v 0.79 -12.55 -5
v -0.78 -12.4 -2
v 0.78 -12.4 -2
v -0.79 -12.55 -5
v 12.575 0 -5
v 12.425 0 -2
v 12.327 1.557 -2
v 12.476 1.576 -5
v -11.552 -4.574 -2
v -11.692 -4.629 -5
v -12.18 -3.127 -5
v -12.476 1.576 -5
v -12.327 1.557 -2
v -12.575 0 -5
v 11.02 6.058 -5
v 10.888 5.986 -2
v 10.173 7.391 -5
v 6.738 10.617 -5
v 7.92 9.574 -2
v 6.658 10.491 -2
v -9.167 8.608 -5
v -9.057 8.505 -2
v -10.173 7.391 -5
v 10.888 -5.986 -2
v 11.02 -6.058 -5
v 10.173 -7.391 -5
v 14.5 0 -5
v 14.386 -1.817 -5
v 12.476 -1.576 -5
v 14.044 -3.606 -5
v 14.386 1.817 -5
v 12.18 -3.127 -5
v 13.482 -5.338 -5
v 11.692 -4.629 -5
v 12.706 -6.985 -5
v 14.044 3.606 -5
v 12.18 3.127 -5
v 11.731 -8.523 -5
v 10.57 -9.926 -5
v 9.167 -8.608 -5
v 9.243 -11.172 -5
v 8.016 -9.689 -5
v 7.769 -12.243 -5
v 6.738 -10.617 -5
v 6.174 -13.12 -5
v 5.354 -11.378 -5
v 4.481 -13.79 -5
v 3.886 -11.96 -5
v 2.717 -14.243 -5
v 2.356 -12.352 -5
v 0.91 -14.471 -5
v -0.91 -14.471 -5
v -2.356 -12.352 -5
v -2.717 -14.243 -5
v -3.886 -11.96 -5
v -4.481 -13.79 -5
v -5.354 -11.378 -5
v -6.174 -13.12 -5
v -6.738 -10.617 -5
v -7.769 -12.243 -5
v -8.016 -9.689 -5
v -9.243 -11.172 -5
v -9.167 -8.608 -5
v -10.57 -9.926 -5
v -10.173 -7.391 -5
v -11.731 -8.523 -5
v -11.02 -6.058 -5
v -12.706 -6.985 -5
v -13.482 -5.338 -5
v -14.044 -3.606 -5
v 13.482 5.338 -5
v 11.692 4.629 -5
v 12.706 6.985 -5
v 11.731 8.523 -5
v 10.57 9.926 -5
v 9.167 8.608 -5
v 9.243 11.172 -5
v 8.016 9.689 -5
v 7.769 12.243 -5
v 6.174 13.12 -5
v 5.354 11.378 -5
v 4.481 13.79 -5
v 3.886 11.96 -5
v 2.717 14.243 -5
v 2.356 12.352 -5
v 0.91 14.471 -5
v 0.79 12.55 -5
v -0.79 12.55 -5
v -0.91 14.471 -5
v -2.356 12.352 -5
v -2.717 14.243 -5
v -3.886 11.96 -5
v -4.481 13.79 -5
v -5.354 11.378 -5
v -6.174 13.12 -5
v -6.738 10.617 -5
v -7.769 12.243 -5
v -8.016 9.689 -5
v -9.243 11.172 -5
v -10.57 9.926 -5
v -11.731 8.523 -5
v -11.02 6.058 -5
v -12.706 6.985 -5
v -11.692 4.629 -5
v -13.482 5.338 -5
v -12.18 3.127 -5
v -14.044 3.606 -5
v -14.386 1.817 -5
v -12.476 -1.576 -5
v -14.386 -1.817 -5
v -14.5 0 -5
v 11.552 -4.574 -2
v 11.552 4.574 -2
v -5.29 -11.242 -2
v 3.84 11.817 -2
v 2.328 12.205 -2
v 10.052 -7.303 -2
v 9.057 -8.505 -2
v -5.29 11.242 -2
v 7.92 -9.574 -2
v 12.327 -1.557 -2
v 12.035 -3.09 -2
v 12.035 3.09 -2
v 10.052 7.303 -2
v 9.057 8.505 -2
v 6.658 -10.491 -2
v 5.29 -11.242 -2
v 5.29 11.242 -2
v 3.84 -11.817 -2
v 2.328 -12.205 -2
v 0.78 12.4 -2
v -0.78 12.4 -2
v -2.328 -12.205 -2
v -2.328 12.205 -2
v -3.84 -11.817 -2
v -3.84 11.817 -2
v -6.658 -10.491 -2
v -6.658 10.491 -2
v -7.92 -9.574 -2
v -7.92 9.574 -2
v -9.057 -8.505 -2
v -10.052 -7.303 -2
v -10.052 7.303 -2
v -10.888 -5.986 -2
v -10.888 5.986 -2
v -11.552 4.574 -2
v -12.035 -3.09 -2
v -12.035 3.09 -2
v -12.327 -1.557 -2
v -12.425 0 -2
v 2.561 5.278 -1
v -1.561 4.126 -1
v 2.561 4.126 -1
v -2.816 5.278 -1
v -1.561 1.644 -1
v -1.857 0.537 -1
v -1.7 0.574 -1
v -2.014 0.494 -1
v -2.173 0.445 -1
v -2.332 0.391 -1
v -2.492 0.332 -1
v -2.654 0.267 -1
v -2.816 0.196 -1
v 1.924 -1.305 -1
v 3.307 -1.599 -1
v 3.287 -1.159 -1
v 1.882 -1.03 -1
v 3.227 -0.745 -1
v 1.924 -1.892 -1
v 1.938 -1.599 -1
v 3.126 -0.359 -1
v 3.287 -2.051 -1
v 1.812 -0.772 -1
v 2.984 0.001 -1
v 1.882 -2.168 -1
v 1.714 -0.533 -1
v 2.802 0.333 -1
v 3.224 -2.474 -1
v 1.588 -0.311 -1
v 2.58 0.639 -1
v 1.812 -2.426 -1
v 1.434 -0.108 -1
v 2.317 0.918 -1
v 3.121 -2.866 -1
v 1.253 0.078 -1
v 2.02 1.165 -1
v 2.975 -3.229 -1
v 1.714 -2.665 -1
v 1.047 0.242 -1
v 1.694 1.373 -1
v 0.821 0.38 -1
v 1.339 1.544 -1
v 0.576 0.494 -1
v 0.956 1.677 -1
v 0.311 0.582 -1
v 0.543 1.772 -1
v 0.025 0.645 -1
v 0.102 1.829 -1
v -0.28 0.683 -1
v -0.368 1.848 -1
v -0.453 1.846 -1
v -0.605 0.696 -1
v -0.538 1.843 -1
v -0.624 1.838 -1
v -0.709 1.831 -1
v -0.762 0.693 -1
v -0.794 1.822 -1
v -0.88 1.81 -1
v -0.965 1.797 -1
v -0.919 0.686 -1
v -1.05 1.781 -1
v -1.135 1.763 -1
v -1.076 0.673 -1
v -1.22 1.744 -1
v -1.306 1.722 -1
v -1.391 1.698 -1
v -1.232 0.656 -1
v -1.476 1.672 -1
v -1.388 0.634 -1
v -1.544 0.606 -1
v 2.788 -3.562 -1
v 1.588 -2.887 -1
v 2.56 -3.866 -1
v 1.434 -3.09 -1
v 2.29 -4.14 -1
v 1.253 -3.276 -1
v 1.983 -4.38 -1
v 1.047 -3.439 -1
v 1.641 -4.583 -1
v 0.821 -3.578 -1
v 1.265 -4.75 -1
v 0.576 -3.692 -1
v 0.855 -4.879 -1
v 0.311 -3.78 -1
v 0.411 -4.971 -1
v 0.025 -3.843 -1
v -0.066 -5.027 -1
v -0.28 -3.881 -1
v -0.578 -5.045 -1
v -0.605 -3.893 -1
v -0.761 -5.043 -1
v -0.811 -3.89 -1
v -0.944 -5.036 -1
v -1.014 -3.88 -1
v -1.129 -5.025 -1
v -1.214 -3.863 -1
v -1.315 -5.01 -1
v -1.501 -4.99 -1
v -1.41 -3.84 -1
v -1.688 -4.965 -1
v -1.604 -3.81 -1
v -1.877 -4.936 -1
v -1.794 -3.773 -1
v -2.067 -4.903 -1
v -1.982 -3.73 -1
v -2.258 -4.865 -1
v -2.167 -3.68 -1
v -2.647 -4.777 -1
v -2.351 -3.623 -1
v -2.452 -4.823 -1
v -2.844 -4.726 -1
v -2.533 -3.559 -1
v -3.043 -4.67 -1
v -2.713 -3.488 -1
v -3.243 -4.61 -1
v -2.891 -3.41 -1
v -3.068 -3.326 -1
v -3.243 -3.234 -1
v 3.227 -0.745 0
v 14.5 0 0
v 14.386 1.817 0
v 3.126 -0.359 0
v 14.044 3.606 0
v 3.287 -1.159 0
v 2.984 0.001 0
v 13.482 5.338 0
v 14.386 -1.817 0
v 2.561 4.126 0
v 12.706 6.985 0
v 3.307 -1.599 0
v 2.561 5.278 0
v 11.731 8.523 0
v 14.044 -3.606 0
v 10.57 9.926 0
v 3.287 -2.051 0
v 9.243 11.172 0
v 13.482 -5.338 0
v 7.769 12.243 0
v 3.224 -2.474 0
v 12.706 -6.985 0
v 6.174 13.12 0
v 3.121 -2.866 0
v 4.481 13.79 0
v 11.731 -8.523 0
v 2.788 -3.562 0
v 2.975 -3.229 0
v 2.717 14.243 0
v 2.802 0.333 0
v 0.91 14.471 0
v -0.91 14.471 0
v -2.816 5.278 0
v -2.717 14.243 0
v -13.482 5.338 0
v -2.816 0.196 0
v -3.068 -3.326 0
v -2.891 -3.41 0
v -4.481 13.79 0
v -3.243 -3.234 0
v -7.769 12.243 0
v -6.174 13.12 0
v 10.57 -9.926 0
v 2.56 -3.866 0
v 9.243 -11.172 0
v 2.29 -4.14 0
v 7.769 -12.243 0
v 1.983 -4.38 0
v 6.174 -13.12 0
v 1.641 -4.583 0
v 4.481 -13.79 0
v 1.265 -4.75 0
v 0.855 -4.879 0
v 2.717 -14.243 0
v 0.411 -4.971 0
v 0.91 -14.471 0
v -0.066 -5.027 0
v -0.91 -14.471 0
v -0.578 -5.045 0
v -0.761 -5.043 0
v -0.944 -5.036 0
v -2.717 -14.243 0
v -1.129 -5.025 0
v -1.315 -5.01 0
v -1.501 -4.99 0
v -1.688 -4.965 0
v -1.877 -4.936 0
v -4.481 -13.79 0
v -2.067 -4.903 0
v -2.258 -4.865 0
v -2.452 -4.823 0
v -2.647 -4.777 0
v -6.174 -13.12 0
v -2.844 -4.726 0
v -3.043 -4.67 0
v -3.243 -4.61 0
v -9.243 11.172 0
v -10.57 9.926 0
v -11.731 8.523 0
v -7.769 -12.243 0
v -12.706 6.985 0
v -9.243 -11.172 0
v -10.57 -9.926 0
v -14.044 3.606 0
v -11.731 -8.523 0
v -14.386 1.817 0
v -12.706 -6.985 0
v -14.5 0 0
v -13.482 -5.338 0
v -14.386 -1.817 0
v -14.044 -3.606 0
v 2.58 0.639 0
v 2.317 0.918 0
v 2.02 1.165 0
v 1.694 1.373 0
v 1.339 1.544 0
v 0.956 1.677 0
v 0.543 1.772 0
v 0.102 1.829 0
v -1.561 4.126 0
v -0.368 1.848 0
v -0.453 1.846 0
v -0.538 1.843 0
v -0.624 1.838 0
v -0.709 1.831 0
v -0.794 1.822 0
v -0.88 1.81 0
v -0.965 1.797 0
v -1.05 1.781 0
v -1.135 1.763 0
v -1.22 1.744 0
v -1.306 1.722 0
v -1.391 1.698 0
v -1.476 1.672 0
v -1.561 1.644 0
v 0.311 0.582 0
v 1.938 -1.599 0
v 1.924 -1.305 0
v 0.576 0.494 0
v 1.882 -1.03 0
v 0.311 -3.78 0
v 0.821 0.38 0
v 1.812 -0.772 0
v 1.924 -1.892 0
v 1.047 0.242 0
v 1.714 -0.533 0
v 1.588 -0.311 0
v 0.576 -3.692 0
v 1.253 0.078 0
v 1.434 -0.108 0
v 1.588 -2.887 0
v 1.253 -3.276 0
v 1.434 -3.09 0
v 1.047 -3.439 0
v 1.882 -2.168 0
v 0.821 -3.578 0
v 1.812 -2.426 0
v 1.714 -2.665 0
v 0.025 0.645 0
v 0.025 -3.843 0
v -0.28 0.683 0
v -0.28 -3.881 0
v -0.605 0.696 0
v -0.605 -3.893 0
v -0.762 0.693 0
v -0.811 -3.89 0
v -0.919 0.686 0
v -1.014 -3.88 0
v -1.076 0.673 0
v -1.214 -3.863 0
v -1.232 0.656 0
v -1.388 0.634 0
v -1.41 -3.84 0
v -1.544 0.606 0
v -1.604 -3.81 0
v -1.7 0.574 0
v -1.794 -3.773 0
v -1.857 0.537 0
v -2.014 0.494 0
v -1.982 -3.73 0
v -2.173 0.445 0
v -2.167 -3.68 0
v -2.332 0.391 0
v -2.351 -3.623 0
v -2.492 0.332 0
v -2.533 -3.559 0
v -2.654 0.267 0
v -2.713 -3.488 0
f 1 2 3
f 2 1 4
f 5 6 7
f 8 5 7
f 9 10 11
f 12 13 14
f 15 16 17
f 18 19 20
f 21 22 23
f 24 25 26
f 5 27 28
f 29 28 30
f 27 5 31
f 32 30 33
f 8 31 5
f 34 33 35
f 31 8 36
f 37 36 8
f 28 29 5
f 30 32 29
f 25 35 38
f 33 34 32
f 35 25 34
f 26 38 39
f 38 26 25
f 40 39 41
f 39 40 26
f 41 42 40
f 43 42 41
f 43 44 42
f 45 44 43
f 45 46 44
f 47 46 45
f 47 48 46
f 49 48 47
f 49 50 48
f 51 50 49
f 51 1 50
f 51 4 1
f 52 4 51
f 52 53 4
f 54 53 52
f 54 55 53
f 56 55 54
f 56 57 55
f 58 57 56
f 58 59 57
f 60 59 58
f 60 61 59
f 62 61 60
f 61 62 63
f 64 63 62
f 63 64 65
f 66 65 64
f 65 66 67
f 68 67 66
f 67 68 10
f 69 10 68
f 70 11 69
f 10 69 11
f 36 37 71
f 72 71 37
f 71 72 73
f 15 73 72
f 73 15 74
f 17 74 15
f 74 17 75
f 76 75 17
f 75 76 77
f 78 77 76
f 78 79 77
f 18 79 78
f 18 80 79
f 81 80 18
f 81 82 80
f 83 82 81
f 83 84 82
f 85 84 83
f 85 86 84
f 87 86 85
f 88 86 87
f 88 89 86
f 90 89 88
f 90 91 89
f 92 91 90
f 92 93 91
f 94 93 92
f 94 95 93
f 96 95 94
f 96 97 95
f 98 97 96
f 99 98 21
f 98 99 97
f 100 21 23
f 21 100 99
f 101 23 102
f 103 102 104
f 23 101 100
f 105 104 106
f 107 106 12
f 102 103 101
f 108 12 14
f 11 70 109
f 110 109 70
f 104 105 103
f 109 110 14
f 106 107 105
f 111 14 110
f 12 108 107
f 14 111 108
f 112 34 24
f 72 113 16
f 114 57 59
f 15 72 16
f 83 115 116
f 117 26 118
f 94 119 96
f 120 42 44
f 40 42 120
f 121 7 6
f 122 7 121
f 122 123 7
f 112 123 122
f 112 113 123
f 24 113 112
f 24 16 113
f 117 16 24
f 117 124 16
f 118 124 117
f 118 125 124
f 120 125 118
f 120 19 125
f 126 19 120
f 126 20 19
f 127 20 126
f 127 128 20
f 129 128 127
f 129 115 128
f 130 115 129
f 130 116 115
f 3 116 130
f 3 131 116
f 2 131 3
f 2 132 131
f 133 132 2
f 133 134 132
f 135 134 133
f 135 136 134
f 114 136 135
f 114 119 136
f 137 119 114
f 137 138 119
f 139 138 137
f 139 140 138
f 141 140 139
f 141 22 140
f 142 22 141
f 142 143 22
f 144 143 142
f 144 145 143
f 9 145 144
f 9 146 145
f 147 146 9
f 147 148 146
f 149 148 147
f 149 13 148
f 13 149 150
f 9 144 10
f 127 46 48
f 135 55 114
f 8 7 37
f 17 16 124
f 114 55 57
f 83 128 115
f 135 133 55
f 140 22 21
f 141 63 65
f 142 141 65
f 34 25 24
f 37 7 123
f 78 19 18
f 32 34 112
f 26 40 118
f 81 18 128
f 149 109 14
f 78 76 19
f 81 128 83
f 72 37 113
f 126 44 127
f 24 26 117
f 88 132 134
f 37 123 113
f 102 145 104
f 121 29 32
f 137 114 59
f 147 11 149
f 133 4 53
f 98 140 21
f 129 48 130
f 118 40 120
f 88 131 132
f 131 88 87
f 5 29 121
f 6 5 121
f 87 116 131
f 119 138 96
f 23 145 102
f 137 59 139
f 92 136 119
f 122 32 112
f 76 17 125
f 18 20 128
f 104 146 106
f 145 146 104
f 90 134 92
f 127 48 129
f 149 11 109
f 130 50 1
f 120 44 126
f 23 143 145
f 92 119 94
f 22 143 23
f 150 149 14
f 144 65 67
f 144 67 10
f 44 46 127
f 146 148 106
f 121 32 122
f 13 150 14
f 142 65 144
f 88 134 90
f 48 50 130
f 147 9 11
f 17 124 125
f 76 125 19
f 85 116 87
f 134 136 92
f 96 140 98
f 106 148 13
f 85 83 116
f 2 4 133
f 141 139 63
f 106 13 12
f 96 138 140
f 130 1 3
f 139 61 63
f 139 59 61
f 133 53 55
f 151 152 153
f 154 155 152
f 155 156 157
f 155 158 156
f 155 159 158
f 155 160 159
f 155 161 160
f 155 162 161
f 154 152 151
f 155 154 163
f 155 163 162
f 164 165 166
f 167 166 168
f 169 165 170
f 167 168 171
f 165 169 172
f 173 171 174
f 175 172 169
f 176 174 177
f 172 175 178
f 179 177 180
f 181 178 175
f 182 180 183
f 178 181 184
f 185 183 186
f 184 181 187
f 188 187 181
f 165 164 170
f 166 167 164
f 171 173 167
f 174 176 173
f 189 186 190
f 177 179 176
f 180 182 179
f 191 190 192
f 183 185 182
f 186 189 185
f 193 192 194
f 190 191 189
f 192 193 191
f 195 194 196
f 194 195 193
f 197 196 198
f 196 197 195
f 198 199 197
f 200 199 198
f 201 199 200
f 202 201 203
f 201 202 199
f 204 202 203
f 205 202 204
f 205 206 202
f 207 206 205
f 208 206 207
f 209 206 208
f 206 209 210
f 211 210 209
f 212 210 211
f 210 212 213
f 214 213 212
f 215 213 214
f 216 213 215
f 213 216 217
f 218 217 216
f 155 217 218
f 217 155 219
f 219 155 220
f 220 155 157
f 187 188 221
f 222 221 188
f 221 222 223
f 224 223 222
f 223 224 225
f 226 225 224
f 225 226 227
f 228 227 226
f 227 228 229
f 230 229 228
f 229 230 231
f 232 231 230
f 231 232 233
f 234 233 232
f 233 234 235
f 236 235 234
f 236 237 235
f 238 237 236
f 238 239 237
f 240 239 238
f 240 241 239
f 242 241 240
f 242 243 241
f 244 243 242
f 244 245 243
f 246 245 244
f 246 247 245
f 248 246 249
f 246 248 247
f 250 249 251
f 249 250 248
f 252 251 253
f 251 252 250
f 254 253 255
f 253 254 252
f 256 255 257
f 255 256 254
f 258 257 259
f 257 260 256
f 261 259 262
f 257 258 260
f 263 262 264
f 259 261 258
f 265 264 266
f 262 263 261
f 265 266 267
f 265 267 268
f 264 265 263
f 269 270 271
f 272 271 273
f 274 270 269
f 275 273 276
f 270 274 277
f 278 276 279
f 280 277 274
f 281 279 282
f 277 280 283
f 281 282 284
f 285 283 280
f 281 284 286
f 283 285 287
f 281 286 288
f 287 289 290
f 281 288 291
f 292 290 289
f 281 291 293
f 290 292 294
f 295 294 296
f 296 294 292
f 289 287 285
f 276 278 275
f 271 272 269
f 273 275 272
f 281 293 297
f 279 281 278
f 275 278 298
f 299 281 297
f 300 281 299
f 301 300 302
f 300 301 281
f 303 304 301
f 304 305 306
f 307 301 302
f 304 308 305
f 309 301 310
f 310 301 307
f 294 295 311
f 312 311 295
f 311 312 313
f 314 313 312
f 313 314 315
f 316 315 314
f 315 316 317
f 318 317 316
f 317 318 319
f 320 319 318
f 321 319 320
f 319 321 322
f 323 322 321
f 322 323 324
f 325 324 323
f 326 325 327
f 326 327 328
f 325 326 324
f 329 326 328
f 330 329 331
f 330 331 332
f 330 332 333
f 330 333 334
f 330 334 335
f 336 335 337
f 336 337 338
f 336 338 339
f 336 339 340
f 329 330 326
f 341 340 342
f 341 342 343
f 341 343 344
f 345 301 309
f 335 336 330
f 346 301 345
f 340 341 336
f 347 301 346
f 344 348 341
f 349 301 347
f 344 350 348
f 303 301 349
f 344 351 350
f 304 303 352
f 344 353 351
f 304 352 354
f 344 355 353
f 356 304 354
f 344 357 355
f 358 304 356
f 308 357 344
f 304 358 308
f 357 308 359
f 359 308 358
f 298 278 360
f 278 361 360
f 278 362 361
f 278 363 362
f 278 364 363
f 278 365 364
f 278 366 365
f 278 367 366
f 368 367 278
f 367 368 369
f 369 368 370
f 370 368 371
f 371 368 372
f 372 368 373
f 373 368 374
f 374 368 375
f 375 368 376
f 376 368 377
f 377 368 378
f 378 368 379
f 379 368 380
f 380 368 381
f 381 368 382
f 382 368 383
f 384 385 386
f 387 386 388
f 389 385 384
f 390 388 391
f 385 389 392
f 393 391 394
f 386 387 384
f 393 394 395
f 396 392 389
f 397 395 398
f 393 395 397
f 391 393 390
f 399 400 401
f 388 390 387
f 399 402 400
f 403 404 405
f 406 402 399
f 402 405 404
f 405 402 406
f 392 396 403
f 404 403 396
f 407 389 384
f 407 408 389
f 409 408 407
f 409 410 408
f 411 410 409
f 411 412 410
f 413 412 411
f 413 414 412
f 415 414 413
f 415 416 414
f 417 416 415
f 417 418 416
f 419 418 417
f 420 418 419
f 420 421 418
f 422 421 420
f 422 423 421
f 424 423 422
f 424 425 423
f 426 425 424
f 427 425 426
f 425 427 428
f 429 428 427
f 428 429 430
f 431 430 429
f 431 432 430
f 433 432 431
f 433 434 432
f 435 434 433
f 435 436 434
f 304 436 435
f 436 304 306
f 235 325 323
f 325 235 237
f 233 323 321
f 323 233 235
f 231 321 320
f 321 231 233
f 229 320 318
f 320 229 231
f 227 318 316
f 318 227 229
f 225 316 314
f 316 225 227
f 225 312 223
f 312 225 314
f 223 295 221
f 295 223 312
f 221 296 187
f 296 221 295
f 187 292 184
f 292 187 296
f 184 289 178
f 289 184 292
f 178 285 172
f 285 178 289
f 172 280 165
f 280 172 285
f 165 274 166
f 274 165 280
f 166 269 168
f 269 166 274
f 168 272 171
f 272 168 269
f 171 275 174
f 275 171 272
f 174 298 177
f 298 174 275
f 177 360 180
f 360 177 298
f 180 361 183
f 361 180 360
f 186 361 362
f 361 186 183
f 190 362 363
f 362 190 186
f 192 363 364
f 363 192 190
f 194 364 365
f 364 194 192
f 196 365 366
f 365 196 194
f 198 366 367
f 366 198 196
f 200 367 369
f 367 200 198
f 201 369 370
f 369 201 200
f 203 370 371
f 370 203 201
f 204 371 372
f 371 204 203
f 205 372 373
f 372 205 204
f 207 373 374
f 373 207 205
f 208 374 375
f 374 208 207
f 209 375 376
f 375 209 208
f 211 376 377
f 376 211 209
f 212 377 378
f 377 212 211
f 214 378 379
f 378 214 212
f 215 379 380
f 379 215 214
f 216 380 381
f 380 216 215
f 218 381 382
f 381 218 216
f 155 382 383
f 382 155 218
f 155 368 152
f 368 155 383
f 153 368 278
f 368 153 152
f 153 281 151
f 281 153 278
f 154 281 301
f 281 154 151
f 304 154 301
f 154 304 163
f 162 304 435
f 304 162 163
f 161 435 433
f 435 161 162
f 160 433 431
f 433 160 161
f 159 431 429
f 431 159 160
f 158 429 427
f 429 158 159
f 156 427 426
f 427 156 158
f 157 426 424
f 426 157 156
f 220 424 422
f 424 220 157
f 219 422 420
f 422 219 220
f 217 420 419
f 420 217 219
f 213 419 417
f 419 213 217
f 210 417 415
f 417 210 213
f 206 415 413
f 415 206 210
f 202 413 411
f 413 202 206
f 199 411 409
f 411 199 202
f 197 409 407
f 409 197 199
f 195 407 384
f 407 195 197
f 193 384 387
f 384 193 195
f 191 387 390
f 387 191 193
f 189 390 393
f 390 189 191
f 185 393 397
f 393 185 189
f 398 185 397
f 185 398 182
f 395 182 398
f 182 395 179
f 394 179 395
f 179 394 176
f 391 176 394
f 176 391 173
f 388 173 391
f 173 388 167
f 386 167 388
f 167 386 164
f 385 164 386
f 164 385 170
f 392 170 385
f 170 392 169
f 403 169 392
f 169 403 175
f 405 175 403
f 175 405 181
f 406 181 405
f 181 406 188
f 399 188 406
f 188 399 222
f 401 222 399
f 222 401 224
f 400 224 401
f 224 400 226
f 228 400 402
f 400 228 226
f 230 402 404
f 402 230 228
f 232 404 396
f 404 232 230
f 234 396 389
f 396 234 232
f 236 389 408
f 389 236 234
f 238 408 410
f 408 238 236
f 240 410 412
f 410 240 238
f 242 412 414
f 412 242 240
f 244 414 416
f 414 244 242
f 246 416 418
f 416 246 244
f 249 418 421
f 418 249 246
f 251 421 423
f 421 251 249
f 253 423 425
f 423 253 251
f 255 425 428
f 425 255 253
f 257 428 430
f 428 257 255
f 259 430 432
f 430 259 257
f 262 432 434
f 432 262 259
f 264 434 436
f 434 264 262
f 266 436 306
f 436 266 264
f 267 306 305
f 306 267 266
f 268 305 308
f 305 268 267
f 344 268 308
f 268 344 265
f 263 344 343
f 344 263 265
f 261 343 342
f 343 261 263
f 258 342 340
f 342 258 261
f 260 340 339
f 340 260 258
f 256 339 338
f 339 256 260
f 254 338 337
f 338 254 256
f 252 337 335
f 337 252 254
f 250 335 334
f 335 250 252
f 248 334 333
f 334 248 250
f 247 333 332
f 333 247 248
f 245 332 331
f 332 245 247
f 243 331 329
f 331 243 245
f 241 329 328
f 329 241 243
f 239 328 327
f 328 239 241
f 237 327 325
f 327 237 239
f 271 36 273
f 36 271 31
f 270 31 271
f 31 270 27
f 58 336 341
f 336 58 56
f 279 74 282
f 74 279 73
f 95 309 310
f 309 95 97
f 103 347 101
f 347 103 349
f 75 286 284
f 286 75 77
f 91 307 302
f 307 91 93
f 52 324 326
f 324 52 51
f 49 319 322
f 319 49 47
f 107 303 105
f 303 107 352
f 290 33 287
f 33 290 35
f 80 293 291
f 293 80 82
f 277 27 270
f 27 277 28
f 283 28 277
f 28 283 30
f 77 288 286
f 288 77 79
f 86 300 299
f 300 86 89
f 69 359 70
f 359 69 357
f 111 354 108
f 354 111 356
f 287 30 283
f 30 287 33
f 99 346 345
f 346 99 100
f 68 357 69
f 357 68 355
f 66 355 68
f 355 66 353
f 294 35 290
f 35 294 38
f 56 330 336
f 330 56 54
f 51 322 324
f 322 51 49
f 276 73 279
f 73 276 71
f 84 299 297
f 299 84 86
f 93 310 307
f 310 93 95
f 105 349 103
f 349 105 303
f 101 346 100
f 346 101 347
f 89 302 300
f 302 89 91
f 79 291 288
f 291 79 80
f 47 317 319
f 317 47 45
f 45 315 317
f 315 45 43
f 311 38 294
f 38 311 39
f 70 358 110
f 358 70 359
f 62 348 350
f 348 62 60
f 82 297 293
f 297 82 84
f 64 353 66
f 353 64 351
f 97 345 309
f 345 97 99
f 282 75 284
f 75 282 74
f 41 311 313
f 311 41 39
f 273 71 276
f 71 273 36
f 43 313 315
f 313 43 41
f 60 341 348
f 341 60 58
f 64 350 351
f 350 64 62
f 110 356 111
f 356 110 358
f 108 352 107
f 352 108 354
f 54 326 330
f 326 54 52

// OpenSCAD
$fn = 50;


difference() {
	union() {
		translate(v = [0, 0, -5.0000000000]) {
			cylinder(h = 5, r = 14.5000000000);
		}
	}
	union() {
		#translate(v = [0, 0, -5.0000000000]) {
			cylinder(h = 3, r1 = 12.5750000000, r2 = 12.4250000000);
		}
		translate(v = [0, 0, -1]) {
			linear_extrude(height = 1) {
				text(font = "Impact", halign = "center", size = 10, text = "5", valign = "center");
			}
		}
	}
}
